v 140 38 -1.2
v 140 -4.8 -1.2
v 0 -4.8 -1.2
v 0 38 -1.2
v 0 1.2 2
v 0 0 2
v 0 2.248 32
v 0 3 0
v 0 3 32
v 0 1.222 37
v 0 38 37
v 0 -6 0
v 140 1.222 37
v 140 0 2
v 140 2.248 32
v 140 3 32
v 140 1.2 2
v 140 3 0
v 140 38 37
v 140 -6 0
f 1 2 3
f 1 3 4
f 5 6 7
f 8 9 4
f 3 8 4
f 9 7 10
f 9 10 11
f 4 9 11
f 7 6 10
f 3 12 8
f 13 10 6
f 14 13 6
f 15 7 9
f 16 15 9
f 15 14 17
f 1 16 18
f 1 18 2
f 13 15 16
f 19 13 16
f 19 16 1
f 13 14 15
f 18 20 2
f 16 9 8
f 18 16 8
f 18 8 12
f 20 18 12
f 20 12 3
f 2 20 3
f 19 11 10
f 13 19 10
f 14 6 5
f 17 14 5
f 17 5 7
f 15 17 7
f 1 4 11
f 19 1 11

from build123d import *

# Parameters (mm, degrees)
F1_DEPTH = 140


with BuildPart() as f1:
    # F0 (on Right) → F1 (new body)
    with BuildSketch(Plane.YZ):
        Polygon((3, 0), (0, 0), (-6, 0), (-4.8, -1.2), (38, -1.2), (38, 0), align=None)
        Polygon((3, 32), (3, 0), (38, 0), (38, 37), (3, 37), align=None)
        Polygon((2.247623, 32), (3, 32), (3, 37), (2.422227, 37), align=None)
        Polygon((1.2, 2), (2.247623, 32), (2.422227, 37), (1.222227, 37), (0, 2), align=None)
    extrude(amount=F1_DEPTH)


solid = f1.part
